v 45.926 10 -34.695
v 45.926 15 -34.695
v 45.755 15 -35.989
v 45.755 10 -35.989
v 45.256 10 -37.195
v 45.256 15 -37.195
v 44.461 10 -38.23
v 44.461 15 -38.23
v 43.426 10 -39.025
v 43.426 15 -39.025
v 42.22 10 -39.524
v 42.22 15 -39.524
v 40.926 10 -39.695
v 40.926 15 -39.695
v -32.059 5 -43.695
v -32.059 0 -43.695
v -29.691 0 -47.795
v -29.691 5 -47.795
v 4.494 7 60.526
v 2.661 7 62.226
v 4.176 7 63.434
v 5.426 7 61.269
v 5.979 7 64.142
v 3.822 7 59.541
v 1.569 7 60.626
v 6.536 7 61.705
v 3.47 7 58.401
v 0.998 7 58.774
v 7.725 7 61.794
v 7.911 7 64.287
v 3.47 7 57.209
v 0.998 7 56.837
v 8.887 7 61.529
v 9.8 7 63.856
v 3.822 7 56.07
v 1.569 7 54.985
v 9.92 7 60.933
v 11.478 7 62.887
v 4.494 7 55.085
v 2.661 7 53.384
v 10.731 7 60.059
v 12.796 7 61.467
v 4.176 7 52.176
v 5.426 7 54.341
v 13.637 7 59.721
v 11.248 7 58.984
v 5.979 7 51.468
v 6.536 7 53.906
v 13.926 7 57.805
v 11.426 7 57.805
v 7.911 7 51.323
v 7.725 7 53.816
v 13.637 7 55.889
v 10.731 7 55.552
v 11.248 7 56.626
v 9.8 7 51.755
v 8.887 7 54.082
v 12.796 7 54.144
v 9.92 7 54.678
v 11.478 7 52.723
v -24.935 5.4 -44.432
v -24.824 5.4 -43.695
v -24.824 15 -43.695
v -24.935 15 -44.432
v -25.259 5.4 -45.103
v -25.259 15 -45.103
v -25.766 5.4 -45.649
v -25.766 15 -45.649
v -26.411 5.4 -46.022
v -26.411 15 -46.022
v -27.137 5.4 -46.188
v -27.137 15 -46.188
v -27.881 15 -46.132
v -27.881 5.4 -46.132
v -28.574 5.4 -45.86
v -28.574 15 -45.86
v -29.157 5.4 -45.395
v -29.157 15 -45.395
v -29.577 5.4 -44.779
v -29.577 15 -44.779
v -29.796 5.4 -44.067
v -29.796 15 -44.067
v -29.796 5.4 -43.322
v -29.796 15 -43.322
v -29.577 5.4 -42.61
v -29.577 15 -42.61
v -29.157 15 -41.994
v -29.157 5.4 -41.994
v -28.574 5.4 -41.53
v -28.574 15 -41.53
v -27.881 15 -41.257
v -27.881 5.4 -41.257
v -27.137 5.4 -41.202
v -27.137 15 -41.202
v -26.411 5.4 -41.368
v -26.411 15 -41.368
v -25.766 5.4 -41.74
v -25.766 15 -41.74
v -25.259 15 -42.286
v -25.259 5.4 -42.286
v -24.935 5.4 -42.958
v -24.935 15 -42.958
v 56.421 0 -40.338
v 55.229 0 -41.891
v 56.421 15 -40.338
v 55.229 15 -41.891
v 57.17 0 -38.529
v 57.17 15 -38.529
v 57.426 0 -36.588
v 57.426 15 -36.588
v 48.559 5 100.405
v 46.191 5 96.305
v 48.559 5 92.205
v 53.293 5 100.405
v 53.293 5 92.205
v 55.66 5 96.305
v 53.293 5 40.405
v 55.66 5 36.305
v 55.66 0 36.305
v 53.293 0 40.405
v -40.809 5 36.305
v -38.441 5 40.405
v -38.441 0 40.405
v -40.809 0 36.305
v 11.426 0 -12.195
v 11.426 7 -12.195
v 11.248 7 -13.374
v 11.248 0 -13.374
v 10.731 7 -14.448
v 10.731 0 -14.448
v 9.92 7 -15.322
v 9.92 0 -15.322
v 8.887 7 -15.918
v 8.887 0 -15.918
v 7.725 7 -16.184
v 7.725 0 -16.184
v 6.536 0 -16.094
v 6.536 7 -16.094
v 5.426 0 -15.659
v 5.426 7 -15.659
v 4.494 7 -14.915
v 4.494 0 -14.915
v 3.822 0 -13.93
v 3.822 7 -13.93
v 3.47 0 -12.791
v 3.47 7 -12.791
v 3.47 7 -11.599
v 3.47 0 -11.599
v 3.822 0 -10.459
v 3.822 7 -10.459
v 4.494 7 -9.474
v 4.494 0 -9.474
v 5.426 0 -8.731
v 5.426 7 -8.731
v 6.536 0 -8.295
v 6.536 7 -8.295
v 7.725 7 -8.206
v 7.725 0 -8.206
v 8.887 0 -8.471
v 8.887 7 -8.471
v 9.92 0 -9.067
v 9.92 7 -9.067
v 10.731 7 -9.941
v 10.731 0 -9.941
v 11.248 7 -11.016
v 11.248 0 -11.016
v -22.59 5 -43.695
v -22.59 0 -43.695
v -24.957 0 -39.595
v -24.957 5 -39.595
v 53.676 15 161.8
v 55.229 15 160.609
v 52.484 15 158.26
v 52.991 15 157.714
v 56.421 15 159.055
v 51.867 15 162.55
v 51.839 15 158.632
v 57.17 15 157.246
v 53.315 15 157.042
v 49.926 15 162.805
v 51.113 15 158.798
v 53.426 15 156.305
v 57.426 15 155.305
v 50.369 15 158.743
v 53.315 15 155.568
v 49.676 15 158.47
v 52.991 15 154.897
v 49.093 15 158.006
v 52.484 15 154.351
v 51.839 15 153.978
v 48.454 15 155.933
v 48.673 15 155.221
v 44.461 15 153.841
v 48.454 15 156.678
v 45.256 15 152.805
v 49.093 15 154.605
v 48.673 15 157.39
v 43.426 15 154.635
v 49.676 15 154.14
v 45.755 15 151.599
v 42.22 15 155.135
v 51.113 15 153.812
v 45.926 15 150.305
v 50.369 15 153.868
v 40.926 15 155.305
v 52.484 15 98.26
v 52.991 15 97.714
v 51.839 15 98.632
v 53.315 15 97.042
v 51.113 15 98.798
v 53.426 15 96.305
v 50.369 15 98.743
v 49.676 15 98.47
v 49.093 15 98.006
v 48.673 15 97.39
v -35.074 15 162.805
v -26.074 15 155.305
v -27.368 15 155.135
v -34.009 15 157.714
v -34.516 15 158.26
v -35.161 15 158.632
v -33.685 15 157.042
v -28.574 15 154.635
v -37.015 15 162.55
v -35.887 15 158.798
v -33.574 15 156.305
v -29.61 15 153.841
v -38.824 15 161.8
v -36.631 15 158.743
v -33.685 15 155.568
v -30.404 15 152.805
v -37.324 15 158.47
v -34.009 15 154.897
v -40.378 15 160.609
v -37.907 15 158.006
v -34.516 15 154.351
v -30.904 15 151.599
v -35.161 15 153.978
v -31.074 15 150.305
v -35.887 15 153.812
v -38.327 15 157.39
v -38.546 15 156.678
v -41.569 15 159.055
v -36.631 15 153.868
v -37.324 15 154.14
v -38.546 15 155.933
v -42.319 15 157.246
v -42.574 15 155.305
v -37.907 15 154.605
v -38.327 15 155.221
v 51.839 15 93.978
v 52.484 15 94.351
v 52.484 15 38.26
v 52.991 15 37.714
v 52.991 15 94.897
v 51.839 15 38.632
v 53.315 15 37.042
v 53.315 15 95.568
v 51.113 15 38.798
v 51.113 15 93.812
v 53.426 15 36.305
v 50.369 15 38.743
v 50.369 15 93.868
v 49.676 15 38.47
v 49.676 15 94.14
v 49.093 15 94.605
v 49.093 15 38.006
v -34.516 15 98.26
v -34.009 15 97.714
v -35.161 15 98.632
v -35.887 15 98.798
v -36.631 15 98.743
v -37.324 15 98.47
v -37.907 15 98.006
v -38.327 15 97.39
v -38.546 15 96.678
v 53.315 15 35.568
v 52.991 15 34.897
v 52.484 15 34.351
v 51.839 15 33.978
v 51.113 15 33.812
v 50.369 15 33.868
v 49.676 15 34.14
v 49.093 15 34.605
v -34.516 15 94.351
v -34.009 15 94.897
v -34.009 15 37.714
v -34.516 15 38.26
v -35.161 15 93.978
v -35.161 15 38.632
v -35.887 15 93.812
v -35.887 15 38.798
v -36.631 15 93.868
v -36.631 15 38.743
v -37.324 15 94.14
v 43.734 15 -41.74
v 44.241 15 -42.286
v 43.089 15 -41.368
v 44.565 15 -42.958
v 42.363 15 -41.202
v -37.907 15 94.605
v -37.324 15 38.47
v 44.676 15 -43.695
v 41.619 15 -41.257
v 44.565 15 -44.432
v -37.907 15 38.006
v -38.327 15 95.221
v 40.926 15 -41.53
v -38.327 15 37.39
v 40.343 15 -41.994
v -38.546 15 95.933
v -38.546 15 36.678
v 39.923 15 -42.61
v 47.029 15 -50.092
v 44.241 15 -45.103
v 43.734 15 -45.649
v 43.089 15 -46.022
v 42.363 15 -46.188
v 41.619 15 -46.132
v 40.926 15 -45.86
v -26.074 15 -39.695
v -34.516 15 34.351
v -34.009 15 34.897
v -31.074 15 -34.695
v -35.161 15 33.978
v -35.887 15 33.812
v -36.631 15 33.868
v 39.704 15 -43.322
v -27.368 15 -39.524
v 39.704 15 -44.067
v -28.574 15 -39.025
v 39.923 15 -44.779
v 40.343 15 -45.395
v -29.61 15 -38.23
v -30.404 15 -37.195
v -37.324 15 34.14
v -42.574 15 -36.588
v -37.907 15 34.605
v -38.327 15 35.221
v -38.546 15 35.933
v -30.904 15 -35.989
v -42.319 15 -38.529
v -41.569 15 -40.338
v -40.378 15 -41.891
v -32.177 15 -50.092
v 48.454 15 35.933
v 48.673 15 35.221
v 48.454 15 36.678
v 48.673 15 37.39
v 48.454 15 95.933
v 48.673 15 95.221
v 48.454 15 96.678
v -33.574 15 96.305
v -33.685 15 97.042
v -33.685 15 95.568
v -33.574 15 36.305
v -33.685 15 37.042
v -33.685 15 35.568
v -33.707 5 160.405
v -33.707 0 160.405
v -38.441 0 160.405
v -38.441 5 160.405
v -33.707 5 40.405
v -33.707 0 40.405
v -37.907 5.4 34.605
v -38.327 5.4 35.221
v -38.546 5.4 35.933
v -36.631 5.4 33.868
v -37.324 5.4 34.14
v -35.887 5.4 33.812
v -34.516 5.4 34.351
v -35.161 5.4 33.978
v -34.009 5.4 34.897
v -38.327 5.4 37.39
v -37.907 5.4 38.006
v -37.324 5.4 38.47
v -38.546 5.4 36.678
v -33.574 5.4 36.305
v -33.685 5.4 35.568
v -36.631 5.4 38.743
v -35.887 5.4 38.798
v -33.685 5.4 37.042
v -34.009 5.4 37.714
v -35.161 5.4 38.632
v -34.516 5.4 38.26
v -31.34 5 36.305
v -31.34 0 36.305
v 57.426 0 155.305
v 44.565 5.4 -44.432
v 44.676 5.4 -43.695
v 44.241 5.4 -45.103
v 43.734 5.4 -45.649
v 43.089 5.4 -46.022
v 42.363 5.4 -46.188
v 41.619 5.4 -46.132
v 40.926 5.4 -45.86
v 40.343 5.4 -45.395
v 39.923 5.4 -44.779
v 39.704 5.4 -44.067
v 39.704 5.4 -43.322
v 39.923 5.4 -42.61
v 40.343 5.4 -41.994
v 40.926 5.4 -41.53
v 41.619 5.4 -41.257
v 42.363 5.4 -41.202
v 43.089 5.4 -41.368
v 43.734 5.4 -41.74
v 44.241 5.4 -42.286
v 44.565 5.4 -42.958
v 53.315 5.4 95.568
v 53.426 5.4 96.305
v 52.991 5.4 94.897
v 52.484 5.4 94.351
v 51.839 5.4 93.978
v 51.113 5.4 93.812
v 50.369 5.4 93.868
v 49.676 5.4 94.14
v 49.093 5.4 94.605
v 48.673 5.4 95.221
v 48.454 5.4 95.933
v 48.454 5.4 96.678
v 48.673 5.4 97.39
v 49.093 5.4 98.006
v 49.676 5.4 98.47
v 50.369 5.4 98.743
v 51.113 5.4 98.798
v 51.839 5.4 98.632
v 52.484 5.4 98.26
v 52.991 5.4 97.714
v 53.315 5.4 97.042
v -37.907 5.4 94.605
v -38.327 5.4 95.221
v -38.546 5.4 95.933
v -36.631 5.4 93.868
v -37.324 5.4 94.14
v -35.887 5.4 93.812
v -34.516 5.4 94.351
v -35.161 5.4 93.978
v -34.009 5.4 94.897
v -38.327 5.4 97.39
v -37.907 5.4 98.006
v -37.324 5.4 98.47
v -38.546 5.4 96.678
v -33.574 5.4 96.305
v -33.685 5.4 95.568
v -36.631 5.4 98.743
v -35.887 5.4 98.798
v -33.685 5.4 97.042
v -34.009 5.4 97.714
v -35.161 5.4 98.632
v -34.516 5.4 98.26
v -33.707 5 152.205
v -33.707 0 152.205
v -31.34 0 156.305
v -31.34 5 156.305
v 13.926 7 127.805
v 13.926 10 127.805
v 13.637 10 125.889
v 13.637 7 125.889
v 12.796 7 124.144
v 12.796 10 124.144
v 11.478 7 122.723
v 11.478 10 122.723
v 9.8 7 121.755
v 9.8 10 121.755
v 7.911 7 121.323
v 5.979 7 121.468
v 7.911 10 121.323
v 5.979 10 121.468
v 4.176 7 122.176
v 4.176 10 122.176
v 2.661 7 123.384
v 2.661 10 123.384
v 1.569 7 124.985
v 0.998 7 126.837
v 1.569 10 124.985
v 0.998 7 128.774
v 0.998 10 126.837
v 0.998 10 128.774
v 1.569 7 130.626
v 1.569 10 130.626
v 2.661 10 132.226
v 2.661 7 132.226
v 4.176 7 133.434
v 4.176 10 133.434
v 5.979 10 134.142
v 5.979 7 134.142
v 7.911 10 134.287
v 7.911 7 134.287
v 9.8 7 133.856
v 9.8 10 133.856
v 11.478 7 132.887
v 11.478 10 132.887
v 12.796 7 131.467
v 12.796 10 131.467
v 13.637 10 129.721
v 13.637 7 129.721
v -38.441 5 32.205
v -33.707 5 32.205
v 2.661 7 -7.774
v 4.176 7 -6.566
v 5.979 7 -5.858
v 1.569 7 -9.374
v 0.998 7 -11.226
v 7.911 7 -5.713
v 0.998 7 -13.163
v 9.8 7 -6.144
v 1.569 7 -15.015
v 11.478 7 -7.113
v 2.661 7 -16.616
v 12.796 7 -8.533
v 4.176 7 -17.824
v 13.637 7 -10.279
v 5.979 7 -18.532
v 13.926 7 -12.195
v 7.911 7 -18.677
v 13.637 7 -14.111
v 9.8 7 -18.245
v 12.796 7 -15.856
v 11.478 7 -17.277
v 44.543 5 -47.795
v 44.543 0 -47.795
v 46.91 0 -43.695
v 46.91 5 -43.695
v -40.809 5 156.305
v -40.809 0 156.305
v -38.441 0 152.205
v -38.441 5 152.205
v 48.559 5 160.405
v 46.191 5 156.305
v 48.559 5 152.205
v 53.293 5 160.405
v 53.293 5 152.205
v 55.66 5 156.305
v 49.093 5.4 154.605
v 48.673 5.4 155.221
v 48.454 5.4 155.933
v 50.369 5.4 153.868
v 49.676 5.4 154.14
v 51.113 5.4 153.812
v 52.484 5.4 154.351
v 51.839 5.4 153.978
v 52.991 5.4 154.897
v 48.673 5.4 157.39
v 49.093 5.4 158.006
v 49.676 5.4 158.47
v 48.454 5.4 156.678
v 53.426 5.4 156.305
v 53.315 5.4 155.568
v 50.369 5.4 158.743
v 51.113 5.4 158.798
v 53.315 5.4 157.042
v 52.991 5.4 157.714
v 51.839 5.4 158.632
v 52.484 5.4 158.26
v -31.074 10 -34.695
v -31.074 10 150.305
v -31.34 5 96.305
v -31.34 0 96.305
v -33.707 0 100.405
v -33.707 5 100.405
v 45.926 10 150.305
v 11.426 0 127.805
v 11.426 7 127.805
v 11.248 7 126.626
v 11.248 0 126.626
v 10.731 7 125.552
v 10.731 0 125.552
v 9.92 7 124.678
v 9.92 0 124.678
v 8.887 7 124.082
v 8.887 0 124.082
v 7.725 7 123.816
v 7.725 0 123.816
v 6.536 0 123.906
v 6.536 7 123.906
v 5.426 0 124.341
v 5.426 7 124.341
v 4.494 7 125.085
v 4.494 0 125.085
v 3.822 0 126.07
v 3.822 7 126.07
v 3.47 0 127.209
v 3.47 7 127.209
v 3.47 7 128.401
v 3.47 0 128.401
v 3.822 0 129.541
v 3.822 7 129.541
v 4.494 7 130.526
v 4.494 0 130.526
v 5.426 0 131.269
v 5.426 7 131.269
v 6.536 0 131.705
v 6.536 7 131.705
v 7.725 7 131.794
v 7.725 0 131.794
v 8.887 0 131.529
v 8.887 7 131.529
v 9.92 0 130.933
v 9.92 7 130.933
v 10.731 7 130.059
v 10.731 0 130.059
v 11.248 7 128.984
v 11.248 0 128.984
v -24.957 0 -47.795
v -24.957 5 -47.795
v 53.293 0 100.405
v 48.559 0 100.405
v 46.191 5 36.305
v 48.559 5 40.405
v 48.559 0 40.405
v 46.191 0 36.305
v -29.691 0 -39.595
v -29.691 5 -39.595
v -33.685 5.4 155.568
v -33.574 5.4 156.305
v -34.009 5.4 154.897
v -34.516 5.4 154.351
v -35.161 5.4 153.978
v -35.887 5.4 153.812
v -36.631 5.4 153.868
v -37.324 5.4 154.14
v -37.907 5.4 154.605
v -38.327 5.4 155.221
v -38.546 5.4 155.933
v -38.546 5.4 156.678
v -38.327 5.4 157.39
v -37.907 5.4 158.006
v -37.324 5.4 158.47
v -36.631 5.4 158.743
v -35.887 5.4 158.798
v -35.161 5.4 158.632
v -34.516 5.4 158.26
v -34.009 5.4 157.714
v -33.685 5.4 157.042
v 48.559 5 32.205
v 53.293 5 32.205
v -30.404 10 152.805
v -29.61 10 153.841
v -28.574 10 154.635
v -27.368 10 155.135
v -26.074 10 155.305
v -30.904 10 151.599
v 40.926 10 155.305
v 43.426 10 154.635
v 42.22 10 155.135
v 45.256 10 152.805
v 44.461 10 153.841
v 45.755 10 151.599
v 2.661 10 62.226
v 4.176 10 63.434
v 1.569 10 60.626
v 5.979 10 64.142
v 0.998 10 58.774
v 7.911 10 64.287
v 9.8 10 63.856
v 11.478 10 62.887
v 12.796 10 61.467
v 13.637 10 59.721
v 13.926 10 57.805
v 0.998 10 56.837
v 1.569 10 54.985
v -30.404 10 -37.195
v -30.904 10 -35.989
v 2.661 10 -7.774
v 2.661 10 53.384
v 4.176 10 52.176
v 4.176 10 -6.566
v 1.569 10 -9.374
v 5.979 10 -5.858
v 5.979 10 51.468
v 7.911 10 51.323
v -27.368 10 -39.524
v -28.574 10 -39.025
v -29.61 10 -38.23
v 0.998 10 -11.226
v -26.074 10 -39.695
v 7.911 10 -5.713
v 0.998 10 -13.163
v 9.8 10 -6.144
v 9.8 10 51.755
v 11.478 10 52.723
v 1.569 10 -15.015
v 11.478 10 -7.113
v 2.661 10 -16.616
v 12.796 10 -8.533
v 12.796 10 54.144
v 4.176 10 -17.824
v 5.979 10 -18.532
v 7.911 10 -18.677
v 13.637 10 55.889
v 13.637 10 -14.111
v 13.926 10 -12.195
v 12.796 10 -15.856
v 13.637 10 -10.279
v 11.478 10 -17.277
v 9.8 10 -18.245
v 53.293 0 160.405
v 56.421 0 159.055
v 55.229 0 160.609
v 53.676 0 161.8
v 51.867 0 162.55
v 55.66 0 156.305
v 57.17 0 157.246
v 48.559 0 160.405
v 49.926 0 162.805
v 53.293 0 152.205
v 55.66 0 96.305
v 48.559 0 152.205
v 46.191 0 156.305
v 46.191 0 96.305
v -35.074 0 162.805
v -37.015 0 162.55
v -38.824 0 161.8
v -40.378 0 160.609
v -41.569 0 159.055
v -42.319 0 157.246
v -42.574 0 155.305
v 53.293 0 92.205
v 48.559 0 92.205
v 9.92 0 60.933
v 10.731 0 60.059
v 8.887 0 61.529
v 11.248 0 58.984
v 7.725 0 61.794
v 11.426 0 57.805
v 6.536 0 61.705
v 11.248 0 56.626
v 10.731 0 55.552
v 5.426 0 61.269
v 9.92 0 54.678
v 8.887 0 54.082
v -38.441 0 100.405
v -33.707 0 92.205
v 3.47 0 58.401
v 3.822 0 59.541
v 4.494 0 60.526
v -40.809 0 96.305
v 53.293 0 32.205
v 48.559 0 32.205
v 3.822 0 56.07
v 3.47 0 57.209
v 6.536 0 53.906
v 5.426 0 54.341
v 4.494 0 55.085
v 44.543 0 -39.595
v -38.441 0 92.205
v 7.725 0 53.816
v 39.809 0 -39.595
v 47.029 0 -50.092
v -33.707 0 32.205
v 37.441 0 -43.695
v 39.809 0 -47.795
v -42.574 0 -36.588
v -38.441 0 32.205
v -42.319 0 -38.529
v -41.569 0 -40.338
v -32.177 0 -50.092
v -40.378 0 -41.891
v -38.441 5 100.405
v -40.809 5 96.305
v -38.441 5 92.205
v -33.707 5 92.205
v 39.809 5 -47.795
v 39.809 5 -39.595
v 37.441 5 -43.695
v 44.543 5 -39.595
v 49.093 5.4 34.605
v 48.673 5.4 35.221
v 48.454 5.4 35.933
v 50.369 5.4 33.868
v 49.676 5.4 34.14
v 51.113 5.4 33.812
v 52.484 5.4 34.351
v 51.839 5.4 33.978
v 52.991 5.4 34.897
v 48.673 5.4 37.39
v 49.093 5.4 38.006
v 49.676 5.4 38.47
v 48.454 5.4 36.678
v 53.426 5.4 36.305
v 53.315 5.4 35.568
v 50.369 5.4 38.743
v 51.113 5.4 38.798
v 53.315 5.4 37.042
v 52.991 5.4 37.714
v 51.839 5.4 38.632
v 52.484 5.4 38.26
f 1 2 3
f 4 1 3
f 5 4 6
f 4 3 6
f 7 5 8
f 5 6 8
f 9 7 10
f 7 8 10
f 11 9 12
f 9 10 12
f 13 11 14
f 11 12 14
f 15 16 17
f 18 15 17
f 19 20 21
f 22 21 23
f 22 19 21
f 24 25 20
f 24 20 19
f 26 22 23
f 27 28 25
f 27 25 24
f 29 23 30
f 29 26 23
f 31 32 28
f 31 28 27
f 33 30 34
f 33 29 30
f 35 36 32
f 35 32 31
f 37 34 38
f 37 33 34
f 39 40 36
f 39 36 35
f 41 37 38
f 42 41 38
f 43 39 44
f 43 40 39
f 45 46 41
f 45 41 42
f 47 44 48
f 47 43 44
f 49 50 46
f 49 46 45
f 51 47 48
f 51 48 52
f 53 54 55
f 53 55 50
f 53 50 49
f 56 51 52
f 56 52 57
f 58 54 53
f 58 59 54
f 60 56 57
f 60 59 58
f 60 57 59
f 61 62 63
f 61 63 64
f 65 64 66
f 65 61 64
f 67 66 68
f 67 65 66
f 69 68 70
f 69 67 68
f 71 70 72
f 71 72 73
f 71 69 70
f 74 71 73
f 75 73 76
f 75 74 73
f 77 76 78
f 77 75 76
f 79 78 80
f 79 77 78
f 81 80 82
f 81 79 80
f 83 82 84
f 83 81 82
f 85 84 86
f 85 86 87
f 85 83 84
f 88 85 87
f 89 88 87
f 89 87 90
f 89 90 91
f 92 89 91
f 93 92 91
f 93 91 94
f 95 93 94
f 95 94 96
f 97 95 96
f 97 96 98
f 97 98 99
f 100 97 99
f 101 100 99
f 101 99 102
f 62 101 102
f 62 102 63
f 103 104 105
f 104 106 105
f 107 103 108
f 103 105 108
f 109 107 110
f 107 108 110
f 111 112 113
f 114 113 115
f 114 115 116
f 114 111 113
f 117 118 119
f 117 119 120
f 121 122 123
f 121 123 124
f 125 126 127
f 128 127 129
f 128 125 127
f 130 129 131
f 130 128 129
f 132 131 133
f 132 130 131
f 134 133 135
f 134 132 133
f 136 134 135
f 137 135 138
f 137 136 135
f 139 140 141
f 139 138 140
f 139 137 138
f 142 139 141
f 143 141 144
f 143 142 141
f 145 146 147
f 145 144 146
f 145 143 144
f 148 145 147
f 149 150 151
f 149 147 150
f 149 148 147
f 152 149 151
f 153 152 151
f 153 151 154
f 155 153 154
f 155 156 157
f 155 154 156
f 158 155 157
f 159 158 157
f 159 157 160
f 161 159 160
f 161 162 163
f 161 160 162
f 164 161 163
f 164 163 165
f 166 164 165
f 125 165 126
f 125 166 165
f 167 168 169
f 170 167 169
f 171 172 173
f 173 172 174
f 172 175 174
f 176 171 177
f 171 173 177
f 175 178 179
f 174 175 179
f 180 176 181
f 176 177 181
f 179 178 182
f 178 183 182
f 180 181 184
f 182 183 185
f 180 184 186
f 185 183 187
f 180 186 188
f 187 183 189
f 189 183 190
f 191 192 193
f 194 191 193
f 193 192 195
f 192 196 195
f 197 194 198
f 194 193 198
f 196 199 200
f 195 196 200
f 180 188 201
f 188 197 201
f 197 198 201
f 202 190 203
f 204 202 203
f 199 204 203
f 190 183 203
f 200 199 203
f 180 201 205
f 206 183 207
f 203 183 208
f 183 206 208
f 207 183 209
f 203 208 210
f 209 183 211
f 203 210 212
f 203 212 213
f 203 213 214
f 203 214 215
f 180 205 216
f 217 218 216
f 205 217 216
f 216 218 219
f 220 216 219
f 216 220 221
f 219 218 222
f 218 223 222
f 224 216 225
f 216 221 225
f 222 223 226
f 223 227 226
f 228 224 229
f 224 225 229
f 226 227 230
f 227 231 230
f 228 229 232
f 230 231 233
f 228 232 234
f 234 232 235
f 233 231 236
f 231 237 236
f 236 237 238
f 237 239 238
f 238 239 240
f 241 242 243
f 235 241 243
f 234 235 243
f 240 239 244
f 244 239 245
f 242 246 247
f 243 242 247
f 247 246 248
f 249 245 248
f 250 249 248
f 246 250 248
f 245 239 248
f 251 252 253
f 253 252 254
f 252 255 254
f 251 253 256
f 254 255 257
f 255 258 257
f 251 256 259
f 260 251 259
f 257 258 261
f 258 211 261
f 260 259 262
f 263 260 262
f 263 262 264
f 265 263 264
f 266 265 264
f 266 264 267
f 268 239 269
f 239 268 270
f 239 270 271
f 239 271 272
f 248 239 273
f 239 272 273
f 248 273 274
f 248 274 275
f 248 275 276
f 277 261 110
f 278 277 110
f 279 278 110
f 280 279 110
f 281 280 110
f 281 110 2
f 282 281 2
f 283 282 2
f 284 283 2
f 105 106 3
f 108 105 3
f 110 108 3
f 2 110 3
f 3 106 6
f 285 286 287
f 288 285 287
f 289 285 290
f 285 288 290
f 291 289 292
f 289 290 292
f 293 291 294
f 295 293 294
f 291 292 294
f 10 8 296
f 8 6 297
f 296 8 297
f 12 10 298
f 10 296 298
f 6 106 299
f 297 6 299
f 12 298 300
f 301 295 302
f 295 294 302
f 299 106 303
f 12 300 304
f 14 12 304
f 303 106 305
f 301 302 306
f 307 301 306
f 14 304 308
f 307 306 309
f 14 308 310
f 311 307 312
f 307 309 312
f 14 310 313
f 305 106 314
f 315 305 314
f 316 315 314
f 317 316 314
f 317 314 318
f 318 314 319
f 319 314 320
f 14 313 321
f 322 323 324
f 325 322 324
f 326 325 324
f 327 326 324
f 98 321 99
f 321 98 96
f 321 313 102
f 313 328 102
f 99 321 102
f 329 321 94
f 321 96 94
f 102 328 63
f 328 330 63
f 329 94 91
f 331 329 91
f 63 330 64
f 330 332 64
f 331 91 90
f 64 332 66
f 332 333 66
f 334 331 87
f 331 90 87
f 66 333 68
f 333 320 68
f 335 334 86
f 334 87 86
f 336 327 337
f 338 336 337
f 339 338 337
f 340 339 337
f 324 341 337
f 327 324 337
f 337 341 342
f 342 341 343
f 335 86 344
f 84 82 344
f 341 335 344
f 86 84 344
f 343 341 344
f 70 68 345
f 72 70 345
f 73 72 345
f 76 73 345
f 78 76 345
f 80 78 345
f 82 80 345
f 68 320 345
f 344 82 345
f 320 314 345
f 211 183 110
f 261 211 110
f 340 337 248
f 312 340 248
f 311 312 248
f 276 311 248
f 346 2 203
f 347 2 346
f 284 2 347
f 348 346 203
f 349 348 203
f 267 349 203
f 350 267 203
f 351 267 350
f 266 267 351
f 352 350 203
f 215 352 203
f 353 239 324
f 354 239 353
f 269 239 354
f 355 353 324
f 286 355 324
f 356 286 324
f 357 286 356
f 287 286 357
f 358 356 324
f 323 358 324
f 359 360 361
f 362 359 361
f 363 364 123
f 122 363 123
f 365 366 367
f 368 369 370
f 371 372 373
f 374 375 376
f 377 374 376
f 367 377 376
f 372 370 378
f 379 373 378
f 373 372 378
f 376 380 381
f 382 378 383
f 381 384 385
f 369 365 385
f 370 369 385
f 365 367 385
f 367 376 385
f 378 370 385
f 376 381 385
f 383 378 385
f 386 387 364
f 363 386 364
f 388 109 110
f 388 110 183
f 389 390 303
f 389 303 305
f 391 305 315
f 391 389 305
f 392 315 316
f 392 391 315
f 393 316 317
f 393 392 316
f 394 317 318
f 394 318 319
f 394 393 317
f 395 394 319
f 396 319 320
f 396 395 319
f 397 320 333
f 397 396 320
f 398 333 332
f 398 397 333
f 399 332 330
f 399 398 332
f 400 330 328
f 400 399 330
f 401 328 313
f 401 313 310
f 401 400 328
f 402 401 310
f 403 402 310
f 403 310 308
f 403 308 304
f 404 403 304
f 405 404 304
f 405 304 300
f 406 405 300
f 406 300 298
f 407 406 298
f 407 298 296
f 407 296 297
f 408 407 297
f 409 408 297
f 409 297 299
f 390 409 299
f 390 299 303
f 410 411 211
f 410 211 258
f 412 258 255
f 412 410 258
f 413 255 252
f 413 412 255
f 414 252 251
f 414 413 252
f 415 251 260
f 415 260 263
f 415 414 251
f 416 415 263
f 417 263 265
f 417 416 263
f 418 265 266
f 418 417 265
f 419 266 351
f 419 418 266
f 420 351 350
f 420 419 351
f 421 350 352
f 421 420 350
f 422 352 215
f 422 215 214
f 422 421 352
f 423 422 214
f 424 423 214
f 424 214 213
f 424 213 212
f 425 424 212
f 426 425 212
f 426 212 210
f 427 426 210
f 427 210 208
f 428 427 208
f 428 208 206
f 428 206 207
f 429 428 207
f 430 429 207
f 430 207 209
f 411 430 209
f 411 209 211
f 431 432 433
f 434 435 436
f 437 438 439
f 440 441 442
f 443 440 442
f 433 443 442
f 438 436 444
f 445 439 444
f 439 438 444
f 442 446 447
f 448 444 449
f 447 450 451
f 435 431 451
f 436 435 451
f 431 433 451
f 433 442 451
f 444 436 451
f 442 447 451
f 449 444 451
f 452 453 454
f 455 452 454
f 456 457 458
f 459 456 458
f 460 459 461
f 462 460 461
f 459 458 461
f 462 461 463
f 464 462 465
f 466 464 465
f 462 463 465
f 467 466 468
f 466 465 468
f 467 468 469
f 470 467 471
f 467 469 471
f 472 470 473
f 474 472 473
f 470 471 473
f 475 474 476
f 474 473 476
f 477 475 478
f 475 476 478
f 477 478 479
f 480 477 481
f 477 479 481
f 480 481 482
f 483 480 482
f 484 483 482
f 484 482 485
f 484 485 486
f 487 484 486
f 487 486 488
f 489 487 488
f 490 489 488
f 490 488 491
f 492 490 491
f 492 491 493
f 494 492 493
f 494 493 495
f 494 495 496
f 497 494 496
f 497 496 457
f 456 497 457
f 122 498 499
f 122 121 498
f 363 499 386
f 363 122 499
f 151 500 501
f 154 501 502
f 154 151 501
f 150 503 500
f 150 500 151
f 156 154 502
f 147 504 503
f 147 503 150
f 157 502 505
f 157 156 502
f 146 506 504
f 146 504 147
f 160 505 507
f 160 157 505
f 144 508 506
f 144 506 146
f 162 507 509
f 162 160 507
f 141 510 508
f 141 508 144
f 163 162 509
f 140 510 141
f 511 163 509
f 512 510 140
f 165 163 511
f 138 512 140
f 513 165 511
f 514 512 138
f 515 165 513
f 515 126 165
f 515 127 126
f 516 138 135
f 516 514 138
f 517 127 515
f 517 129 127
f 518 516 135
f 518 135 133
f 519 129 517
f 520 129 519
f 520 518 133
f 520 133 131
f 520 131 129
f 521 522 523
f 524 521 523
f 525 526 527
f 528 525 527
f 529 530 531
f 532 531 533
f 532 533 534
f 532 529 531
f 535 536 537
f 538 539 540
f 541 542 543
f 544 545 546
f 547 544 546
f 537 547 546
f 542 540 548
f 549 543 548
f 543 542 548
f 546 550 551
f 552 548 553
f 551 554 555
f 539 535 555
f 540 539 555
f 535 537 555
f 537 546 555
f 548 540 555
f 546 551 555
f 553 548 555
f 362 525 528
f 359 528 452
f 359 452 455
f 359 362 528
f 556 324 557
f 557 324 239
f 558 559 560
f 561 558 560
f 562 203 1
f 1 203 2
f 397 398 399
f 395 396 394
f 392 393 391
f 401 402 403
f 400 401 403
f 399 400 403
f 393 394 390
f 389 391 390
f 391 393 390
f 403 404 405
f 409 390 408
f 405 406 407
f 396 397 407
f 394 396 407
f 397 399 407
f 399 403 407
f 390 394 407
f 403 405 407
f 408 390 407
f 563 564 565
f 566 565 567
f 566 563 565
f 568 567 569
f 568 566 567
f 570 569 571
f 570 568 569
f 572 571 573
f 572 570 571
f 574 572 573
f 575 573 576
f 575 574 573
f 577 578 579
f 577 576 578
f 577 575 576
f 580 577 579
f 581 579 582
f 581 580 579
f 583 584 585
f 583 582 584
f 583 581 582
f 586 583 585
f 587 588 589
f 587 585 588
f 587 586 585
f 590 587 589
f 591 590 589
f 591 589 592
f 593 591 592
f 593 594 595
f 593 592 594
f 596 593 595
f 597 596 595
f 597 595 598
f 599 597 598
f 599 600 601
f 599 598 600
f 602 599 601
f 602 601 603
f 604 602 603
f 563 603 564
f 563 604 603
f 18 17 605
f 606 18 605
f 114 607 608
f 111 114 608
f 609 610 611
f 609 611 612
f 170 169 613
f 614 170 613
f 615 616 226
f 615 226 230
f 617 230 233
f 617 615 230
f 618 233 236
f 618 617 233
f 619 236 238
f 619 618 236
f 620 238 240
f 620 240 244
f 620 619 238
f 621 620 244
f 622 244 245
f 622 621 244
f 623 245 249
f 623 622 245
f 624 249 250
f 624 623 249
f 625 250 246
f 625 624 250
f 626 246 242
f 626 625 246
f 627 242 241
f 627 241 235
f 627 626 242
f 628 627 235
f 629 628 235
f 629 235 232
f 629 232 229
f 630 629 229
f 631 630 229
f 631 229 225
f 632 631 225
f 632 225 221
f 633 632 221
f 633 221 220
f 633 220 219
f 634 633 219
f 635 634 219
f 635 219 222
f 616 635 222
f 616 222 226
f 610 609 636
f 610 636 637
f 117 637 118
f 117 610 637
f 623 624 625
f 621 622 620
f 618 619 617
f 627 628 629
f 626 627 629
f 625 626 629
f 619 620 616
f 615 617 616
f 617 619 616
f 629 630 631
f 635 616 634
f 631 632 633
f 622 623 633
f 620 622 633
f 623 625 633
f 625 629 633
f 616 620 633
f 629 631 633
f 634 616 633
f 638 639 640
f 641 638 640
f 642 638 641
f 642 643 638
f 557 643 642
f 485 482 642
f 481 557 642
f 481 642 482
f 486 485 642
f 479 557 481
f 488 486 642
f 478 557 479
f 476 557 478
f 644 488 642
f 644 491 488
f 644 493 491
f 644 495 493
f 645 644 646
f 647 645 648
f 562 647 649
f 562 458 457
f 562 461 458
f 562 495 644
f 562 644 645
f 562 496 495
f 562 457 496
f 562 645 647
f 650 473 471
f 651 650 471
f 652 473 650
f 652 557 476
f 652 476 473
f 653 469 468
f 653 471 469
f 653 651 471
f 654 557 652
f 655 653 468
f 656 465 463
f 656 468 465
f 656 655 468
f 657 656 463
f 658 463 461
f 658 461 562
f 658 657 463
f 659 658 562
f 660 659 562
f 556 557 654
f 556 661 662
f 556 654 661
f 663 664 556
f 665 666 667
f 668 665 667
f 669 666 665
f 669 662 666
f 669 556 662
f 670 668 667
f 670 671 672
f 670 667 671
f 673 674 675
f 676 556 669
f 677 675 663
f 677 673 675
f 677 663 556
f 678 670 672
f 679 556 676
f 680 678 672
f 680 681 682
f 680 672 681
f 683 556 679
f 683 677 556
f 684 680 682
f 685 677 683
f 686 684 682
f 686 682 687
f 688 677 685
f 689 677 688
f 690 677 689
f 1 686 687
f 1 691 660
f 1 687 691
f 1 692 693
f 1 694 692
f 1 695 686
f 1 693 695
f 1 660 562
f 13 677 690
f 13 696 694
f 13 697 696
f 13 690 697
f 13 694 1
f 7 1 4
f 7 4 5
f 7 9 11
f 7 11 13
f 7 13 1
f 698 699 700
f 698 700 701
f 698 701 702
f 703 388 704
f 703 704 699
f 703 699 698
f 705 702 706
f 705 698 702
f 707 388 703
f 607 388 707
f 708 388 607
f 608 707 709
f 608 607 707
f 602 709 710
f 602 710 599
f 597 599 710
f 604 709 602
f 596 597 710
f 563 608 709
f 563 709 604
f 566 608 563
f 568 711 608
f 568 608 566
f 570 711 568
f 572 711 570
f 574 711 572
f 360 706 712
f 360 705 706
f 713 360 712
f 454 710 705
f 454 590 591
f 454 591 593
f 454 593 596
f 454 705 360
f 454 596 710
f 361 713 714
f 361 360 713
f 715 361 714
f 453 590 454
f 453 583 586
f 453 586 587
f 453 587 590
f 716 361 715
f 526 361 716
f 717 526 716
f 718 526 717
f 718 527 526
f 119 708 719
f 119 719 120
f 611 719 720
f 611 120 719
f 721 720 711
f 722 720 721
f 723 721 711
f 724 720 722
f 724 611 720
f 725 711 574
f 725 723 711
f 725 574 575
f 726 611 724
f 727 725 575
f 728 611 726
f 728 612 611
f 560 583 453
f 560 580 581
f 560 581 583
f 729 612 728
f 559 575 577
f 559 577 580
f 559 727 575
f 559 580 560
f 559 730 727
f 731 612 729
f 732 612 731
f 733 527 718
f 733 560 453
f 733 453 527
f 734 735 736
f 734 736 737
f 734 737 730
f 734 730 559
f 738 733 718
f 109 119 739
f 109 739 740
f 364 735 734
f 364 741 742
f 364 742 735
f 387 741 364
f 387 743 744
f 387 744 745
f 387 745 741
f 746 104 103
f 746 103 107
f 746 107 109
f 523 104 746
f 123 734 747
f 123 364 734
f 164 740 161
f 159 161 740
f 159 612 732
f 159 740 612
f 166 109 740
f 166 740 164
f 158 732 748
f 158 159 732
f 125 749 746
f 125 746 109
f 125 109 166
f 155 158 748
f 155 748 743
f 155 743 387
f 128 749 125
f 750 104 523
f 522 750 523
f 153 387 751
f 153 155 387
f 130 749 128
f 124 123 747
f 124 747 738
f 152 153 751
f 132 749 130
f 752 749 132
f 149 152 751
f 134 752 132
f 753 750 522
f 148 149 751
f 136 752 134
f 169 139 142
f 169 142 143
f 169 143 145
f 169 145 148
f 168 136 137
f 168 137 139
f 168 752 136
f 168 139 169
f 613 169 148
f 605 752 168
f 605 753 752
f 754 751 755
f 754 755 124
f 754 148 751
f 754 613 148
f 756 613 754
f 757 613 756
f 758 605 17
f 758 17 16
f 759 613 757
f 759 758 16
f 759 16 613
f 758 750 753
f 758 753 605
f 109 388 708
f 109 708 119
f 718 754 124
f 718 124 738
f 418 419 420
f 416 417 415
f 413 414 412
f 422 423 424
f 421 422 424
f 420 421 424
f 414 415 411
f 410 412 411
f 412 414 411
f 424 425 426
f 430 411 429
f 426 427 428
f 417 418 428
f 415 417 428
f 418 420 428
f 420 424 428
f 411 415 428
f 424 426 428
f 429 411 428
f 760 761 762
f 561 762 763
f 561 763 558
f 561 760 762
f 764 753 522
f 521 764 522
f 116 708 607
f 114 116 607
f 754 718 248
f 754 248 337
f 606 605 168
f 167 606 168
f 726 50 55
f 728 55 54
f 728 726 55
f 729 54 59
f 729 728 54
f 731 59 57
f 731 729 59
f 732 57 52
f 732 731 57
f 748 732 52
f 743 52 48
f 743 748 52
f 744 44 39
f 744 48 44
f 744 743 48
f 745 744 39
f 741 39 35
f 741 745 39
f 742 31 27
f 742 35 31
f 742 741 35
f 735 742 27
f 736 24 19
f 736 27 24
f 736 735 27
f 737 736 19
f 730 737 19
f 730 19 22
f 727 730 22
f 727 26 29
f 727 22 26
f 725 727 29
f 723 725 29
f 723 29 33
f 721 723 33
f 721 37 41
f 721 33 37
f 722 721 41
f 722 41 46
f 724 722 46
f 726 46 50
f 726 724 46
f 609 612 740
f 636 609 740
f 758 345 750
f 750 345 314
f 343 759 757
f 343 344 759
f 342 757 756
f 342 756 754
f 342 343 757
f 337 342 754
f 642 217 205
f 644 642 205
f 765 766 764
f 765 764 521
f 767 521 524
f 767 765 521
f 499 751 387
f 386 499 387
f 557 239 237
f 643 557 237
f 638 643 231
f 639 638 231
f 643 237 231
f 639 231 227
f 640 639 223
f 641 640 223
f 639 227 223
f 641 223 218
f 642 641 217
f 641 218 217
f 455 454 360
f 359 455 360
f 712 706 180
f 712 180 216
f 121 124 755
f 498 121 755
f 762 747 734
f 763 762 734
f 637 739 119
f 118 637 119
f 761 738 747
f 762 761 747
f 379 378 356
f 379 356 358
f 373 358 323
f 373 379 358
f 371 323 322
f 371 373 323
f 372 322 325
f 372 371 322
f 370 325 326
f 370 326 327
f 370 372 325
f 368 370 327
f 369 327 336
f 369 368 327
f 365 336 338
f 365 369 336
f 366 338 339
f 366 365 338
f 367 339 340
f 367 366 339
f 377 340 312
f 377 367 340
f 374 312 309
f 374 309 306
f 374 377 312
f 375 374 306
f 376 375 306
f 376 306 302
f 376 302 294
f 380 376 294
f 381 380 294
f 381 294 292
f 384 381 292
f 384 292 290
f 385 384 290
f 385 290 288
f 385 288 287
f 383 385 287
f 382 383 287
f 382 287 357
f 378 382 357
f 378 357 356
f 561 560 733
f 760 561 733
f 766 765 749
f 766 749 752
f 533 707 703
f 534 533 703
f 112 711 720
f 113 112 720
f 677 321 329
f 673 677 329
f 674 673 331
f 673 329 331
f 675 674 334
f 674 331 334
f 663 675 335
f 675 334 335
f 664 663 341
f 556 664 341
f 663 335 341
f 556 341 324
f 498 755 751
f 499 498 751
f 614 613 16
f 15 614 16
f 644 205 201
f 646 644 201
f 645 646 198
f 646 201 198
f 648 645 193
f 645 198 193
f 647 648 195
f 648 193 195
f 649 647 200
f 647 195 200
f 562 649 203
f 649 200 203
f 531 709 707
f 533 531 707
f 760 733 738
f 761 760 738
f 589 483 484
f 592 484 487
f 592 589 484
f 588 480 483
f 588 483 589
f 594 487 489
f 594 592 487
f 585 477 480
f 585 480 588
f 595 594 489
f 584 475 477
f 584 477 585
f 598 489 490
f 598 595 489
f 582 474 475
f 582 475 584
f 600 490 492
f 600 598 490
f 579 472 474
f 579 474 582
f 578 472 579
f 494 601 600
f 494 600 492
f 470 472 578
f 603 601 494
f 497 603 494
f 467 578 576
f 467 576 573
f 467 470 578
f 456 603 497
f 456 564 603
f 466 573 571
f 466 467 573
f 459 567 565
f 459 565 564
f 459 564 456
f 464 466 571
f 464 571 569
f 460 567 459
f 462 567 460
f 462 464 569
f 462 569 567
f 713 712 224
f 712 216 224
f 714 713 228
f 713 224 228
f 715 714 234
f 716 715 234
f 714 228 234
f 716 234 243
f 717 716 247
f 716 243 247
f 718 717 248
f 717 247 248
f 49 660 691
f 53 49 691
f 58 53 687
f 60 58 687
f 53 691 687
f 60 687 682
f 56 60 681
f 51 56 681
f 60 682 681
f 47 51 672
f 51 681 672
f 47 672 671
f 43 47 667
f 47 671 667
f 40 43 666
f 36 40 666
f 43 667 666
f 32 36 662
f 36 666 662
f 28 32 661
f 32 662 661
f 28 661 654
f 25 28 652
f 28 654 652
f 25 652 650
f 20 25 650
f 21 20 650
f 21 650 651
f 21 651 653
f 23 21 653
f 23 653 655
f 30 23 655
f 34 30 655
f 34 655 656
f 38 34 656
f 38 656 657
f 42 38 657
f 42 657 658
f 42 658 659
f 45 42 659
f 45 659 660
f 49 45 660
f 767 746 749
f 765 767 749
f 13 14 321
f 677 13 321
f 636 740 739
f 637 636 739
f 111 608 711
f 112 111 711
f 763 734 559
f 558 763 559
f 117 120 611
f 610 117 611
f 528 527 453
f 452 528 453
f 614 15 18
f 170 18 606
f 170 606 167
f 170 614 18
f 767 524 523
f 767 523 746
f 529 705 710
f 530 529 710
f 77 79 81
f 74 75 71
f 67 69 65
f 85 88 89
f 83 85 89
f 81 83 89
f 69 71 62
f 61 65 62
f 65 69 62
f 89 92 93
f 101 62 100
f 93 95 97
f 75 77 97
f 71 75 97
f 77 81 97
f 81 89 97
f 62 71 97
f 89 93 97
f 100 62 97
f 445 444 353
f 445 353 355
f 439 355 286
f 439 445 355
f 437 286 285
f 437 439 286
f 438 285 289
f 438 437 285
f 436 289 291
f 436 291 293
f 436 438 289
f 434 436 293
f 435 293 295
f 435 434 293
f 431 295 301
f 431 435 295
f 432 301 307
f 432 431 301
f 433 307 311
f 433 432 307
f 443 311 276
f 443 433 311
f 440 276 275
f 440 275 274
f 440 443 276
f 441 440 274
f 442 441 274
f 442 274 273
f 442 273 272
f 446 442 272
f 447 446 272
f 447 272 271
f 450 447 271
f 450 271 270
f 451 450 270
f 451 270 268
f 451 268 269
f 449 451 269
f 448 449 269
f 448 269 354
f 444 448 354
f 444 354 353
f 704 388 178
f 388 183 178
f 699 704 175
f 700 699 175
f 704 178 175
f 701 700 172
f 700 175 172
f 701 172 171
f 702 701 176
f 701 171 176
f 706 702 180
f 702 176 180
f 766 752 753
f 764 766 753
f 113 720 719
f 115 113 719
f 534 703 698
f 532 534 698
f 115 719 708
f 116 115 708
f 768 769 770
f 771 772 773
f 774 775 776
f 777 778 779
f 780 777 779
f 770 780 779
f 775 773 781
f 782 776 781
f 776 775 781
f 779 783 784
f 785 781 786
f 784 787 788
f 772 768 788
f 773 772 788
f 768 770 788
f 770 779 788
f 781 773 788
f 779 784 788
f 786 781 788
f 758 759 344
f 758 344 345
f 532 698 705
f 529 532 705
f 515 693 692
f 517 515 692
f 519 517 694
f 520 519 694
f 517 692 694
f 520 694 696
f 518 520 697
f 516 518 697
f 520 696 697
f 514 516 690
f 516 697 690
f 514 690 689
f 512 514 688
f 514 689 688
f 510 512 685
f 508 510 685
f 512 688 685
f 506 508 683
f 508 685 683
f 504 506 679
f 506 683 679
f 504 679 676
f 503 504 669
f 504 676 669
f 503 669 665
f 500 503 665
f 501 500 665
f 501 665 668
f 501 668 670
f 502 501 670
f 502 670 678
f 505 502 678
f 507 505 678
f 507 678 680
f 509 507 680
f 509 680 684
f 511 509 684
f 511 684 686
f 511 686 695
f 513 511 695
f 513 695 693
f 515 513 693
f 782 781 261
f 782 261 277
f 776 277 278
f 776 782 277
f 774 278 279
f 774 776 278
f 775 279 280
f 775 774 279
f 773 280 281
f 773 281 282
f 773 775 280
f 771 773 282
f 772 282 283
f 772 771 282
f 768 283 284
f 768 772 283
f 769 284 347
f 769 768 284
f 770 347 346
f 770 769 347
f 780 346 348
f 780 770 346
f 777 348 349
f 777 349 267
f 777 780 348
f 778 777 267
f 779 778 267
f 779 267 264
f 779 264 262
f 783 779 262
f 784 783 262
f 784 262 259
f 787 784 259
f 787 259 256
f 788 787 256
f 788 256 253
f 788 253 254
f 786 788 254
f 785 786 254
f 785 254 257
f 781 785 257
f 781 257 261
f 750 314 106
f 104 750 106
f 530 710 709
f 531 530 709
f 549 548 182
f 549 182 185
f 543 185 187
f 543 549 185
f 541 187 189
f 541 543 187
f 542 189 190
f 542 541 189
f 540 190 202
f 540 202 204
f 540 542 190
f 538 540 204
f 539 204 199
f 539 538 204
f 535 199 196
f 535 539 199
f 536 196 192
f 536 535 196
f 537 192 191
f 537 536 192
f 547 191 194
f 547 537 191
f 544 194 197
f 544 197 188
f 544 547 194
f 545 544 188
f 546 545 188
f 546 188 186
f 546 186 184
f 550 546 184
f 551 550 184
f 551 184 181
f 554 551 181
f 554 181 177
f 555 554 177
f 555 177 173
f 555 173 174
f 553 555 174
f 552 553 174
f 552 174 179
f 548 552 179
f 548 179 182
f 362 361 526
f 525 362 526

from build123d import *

# Parameters (mm, degrees)
SKETCH1_R           = 2.5
SKETCH1_R_2         = 4
BOSS_EXTRUDE1_DEPTH = 15
SKETCH2_R           = 6.5
CUT_EXTRUDE1_DEPTH  = 8
FILLET1_R           = 7.5
CUT_EXTRUDE2_DEPTH  = 5
SKETCH5_W           = 82.5
SKETCH5_H           = 15.853105066
CUT_EXTRUDE3_DEPTH  = 15
CUT_EXTRUDE4_DEPTH  = 5
SKETCH7_R           = 2.5
BOSS_EXTRUDE2_DEPTH = 0.4


with BuildPart() as part:
    # Sketch1 → Boss-Extrude1 (new body)
    with BuildSketch(Plane(origin=(0, 0, 0), x_dir=(1, 0, 0), z_dir=(0, 1, 0))):
        Polygon((39.925742574, 57.194719472), (57.425742574, 39.694719472), (57.425742574, -162.805280528), (-42.574257426, -162.805280528), (-42.574257426, 39.694719472), (-25.074257426, 57.194719472), align=None)
        with Locations((42.175742574, 43.694719472)):
            Circle(SKETCH1_R, mode=Mode.SUBTRACT)
        with Locations((-27.324257426, 43.694719472)):
            Circle(SKETCH1_R, mode=Mode.SUBTRACT)
        with Locations((50.925742574, -36.305280528)):
            Circle(SKETCH1_R, mode=Mode.SUBTRACT)
        with Locations((-36.074257426, -36.305280528)):
            Circle(SKETCH1_R, mode=Mode.SUBTRACT)
        with Locations((50.925742574, -96.305280528)):
            Circle(SKETCH1_R, mode=Mode.SUBTRACT)
        with Locations((-36.074257426, -96.305280528)):
            Circle(SKETCH1_R, mode=Mode.SUBTRACT)
        with Locations((50.925742574, -156.305280528)):
            Circle(SKETCH1_R, mode=Mode.SUBTRACT)
        with Locations((-36.074257426, -156.305280528)):
            Circle(SKETCH1_R, mode=Mode.SUBTRACT)
        with Locations((7.425742574, -127.805280528)):
            Circle(SKETCH1_R_2, mode=Mode.SUBTRACT)
        with Locations((7.425742574, -57.805280528)):
            Circle(SKETCH1_R_2, mode=Mode.SUBTRACT)
        with Locations((7.425742574, 12.194719472)):
            Circle(SKETCH1_R_2, mode=Mode.SUBTRACT)
    extrude(amount=BOSS_EXTRUDE1_DEPTH)

    # Sketch2 → Cut-Extrude1 (cut)
    with BuildSketch(Plane(origin=(0, 15, 0), x_dir=(1, 0, 0), z_dir=(0, 1, 0))):
        with Locations((7.425742574, 12.194719472)):
            Circle(SKETCH2_R)
        with Locations((7.425742574, -57.805280528)):
            Circle(SKETCH2_R)
        with Locations((7.425742574, -127.805280528)):
            Circle(SKETCH2_R)
    extrude(amount=-CUT_EXTRUDE1_DEPTH, mode=Mode.SUBTRACT)

    # Fillet1
    fillet1_edges = [part.edges().sort_by_distance(p)[0] for p in [
        (57.425742574, 7.5, -39.694719472),
        (57.425742574, 7.5, 162.805280528),
        (-42.574257426, 7.5, 162.805280528),
        (-42.574257426, 7.5, -39.694719472),
        (-25.074257426, 7.5, -57.194719472),
        (39.925742574, 7.5, -57.194719472),
    ]]
    fillet(fillet1_edges, radius=FILLET1_R)

    # Sketch4 → Cut-Extrude2 (cut)
    with BuildSketch(Plane(origin=(0, 15, 0), x_dir=(1, 0, 0), z_dir=(0, 1, 0))):
        with BuildLine():
            Line((-26.074257426, -155.305280528), (40.925742574, -155.305280528))
            ThreePointArc((40.925742574, -155.305280528), (44.46127648, -153.840814434), (45.925742574, -150.305280528))
            Line((45.925742574, -150.305280528), (45.925742574, 34.694719472))
            ThreePointArc((45.925742574, 34.694719472), (44.46127648, 38.230253378), (40.925742574, 39.694719472))
            Line((40.925742574, 39.694719472), (-26.074257426, 39.694719472))
            ThreePointArc((-26.074257426, 39.694719472), (-29.609791332, 38.230253378), (-31.074257426, 34.694719472))
            Line((-31.074257426, 34.694719472), (-31.074257426, -150.305280528))
            ThreePointArc((-31.074257426, -150.305280528), (-29.609791332, -153.840814434), (-26.074257426, -155.305280528))
        make_face()
    extrude(amount=-CUT_EXTRUDE2_DEPTH, mode=Mode.SUBTRACT)

    # Sketch5 → Cut-Extrude3 (cut)
    with BuildSketch(Plane(origin=(0, 15, 0), x_dir=(1, 0, 0), z_dir=(0, 1, 0))):
        with Locations((7.425742574, 58.018166939)):
            Rectangle(SKETCH5_W, SKETCH5_H)
    extrude(amount=-CUT_EXTRUDE3_DEPTH, mode=Mode.SUBTRACT)

    # Sketch6 → Cut-Extrude4 (cut)
    with BuildSketch(Plane.XZ):
        Polygon((-38.441393529, 32.205280528), (-33.707121322, 32.205280528), (-31.339985218, 36.305280528), (-33.707121322, 40.405280528), (-38.441393529, 40.405280528), (-40.808529633, 36.305280528), align=None)
        Polygon((55.660014782, 36.305280528), (53.292878678, 40.405280528), (48.558606471, 40.405280528), (46.191470367, 36.305280528), (48.558606471, 32.205280528), (53.292878678, 32.205280528), align=None)
        Polygon((-22.589985218, -43.694719472), (-24.957121322, -39.594719472), (-29.691393529, -39.594719472), (-32.058529633, -43.694719472), (-29.691393529, -47.794719472), (-24.957121322, -47.794719472), align=None)
        Polygon((46.910014782, -43.694719472), (44.542878678, -39.594719472), (39.808606471, -39.594719472), (37.441470367, -43.694719472), (39.808606471, -47.794719472), (44.542878678, -47.794719472), align=None)
        Polygon((-31.339985218, 96.305280528), (-33.707121322, 100.405280528), (-38.441393529, 100.405280528), (-40.808529633, 96.305280528), (-38.441393529, 92.205280528), (-33.707121322, 92.205280528), align=None)
        Polygon((55.660014782, 96.305280528), (53.292878678, 100.405280528), (48.558606471, 100.405280528), (46.191470367, 96.305280528), (48.558606471, 92.205280528), (53.292878678, 92.205280528), align=None)
        Polygon((55.660014782, 156.305280528), (53.292878678, 160.405280528), (48.558606471, 160.405280528), (46.191470367, 156.305280528), (48.558606471, 152.205280528), (53.292878678, 152.205280528), align=None)
        Polygon((-40.808529633, 156.305280528), (-38.441393529, 152.205280528), (-33.707121322, 152.205280528), (-31.339985218, 156.305280528), (-33.707121322, 160.405280528), (-38.441393529, 160.405280528), align=None)
    extrude(amount=-CUT_EXTRUDE4_DEPTH, mode=Mode.SUBTRACT)

    # Sketch7 → Boss-Extrude2 (add)
    with BuildSketch(Plane.XZ.offset(-5)):
        with Locations((-36.074257426, 156.305280528)):
            Circle(SKETCH7_R)
        with Locations((50.925742574, 156.305280528)):
            Circle(SKETCH7_R)
        with Locations((-36.074257426, 96.305280528)):
            Circle(SKETCH7_R)
        with Locations((50.925742574, 96.305280528)):
            Circle(SKETCH7_R)
        with Locations((-36.074257426, 36.305280528)):
            Circle(SKETCH7_R)
        with Locations((50.925742574, 36.305280528)):
            Circle(SKETCH7_R)
        with Locations((-27.324257426, -43.694719472)):
            Circle(SKETCH7_R)
        with Locations((42.175742574, -43.694719472)):
            Circle(SKETCH7_R)
    extrude(amount=-BOSS_EXTRUDE2_DEPTH)


solid = part.part
